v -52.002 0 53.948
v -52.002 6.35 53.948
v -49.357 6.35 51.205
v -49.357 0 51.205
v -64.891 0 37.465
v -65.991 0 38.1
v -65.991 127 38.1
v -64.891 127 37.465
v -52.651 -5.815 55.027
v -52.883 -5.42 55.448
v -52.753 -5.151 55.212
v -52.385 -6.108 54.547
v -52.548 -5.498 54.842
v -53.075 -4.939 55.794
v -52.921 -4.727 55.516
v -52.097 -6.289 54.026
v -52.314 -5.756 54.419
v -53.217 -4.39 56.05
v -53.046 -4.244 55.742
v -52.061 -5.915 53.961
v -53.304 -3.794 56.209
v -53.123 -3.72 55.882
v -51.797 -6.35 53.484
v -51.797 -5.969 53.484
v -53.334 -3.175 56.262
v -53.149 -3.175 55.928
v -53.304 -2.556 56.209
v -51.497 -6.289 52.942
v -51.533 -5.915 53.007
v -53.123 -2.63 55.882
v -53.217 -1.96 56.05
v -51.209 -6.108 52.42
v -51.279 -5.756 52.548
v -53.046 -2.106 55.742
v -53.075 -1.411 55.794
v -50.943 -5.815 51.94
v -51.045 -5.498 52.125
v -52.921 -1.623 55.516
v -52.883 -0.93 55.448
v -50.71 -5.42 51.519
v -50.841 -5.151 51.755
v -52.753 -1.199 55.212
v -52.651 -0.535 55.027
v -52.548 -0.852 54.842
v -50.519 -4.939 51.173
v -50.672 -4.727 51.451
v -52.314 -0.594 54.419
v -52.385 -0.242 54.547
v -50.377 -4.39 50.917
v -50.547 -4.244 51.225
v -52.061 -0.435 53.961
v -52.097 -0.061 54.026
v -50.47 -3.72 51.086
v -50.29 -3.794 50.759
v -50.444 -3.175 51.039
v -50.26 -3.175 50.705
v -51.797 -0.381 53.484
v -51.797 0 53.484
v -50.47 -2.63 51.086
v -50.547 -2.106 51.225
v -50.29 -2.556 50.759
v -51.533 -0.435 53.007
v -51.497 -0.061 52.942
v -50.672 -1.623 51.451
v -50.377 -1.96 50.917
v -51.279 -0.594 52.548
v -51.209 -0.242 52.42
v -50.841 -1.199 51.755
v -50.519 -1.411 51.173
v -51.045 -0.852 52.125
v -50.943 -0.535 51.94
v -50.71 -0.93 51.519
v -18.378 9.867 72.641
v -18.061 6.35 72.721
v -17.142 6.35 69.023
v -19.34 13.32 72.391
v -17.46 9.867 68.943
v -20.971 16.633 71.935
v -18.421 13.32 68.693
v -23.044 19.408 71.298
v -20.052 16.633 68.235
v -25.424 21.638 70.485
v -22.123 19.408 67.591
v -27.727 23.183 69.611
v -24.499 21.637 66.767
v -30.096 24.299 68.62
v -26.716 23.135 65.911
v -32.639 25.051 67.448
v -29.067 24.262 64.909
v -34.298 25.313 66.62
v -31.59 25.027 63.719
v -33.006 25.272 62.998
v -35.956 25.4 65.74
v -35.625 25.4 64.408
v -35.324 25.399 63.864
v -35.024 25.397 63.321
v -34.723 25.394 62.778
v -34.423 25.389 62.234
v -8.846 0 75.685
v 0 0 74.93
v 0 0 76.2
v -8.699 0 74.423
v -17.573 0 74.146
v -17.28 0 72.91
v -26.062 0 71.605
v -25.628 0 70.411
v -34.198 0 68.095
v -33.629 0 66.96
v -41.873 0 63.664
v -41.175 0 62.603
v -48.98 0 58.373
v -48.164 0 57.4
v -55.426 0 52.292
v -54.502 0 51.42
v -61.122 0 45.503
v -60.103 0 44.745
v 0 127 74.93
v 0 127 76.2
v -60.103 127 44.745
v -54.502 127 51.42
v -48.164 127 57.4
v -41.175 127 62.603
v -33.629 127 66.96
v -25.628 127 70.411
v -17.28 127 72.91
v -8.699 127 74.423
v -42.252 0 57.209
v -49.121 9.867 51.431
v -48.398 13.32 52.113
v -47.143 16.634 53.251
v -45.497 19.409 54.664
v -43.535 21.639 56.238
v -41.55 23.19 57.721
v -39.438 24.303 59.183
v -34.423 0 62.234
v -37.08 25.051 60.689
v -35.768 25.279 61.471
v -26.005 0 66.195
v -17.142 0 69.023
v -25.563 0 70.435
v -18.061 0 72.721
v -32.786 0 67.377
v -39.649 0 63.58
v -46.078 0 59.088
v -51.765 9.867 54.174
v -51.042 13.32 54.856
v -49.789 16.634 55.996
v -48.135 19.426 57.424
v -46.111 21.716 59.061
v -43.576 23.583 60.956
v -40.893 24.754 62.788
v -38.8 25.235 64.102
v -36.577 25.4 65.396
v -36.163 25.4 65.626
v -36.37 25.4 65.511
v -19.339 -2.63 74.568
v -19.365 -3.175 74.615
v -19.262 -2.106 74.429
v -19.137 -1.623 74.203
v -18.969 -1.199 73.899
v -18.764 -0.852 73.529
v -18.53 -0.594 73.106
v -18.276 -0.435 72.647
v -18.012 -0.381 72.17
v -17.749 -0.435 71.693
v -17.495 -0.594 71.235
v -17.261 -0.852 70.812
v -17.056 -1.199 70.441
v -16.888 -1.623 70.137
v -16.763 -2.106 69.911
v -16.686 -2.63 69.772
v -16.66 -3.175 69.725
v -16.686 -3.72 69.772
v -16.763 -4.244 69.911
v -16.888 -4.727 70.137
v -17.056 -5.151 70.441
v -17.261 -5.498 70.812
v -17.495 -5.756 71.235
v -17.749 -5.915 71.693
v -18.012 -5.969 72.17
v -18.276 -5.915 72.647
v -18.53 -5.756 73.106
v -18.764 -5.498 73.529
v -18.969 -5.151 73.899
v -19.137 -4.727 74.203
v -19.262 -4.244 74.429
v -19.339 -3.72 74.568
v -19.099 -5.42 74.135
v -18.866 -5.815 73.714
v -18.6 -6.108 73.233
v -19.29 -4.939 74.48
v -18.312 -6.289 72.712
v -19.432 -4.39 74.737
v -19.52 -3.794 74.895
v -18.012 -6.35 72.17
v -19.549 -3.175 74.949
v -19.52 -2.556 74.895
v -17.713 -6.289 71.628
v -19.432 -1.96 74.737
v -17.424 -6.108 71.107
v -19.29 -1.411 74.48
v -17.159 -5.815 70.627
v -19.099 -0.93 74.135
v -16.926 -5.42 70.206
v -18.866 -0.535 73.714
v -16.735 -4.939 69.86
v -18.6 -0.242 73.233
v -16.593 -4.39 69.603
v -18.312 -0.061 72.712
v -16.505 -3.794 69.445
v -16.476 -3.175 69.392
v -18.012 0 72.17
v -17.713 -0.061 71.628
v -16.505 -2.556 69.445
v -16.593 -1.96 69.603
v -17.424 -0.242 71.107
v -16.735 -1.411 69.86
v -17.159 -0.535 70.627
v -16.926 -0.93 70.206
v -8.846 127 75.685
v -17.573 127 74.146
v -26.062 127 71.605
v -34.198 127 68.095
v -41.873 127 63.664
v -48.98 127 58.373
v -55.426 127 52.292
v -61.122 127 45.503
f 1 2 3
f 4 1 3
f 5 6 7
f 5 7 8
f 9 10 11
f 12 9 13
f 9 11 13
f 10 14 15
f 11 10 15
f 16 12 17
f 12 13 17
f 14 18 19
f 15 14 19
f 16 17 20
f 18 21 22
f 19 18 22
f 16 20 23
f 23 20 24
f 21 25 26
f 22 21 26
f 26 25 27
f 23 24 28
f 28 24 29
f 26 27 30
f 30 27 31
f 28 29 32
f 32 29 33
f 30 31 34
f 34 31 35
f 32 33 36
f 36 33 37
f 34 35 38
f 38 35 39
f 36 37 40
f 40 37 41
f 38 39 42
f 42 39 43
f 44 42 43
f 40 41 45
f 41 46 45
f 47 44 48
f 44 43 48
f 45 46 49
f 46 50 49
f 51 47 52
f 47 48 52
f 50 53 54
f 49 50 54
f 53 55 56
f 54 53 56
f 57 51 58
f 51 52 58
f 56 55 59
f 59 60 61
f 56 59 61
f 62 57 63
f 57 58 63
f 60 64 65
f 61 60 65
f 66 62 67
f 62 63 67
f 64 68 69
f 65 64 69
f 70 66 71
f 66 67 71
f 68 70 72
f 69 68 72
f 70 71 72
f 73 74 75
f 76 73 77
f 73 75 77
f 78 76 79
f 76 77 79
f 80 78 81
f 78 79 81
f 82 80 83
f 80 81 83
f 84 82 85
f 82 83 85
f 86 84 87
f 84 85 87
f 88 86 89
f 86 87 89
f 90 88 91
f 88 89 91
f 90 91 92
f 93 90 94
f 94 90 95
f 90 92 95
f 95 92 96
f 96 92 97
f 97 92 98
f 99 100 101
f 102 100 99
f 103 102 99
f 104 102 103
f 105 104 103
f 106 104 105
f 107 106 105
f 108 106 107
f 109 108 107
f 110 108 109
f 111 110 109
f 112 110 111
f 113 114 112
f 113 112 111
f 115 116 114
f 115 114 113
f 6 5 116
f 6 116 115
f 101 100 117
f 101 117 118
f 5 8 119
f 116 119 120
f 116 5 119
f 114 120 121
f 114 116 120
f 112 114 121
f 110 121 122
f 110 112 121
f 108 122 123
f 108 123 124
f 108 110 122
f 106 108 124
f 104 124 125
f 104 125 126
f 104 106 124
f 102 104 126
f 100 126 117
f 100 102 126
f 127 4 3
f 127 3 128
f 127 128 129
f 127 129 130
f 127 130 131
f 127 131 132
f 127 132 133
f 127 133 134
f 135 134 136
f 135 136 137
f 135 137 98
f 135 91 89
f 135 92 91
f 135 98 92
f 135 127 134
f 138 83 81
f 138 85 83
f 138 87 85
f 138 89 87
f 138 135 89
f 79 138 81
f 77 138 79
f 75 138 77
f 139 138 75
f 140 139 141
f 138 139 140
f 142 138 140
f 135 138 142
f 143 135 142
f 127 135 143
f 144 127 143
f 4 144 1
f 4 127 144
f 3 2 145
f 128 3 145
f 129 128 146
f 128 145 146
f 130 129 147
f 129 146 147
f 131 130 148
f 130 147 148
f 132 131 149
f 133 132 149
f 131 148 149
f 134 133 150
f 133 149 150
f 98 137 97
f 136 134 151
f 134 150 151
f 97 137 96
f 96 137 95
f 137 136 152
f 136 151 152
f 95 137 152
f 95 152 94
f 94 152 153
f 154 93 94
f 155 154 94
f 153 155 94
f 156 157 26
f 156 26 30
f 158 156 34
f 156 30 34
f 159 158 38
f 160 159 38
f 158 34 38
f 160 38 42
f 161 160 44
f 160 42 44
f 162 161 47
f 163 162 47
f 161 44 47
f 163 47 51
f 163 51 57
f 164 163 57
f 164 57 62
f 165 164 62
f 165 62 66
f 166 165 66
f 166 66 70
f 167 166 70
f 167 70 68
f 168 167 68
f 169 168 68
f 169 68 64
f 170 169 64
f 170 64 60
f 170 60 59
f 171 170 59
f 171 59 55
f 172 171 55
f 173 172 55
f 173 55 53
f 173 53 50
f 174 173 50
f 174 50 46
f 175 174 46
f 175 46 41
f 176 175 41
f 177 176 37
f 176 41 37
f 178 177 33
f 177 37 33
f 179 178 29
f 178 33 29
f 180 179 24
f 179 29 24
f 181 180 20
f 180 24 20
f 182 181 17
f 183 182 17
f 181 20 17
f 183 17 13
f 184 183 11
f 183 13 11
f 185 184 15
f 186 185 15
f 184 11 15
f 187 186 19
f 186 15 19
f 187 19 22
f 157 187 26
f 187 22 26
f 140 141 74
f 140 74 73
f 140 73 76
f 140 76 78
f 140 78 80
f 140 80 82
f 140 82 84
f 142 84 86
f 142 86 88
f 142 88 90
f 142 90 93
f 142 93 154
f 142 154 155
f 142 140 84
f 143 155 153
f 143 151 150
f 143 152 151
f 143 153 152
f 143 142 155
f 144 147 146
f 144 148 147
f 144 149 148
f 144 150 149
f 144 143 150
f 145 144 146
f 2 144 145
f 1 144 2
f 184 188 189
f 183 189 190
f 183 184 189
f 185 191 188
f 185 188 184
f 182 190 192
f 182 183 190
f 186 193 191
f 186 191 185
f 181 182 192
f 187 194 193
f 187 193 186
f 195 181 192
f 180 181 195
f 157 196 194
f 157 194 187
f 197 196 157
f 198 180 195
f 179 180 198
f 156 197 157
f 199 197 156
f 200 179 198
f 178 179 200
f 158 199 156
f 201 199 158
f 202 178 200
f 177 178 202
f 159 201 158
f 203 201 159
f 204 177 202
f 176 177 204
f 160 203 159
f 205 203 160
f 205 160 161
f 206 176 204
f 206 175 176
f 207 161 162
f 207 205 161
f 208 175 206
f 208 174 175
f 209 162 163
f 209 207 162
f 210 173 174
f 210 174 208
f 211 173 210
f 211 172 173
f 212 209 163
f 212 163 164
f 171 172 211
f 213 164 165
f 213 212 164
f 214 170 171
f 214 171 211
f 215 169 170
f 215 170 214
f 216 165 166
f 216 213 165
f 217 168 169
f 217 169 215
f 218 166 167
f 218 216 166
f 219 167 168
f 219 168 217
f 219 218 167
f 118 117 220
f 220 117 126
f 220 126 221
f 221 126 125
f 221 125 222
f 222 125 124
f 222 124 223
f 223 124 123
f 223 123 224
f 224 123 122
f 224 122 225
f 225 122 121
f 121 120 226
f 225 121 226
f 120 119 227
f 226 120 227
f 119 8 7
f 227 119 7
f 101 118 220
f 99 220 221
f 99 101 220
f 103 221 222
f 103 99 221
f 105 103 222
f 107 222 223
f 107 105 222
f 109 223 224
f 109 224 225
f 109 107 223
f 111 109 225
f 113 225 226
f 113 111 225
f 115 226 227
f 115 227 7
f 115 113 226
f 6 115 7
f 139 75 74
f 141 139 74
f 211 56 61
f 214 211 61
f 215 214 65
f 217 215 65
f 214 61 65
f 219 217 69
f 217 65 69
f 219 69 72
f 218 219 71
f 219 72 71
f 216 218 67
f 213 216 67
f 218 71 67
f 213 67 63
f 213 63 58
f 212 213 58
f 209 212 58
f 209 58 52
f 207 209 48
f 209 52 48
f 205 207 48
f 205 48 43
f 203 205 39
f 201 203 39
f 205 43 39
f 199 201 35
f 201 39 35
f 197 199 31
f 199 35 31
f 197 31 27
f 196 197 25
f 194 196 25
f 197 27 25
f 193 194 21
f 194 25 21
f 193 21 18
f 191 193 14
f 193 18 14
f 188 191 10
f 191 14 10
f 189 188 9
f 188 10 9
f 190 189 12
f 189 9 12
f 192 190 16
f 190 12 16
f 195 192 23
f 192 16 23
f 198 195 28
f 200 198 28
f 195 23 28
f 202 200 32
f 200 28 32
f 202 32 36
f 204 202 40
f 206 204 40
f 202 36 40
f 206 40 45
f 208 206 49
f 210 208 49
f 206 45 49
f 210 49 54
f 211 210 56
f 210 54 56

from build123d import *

# Parameters (mm, degrees)
EXTRUDE_THIN1_DEPTH      = 127
EXTRUDE_THIN2_DEPTH      = 25.4
FILLET1_R                = 19.05
BOSS_EXTRUDE3_DEPTH      = 0.762
BOSS_EXTRUDE3_DEPTH_BACK = 37.846
SKETCH11_R               = 3.175
SKETCH13_R               = 2.794
CUT_EXTRUDE1_DEPTH       = 43.18


with BuildPart() as part:
    # Sketch1 → Extrude-Thin1 (new body)
    with BuildSketch(Plane(origin=(0, 0, 0), x_dir=(1, 0, 0), z_dir=(0, 1, 0))):
        with BuildLine():
            ThreePointArc((0, -76.2), (-38.1, -65.991135768), (-65.991135768, -38.1))
            Line((-65.991135768, -38.1), (-64.891283506, -37.465))
            ThreePointArc((-64.891283506, -37.465), (-37.465, -64.891283506), (0, -74.93))
            Line((0, -74.93), (0, -76.2))
        make_face()
    extrude(amount=EXTRUDE_THIN1_DEPTH)


with BuildPart() as body_2:
    # Sketch8 → Extrude-Thin2 (new body)
    with BuildSketch(Plane(origin=(0, 0, 0), x_dir=(1, 0, 0), z_dir=(0, 1, 0))):
        with BuildLine():
            ThreePointArc((-18.060810272, -72.720781296), (-36.26692626, -65.568399093), (-52.001511157, -53.947638849))
            Line((-52.001511157, -53.947638849), (-49.357366522, -51.204538569))
            ThreePointArc((-49.357366522, -51.204538569), (-34.422845264, -62.234412699), (-17.142463987, -69.02311445))
            Line((-17.142463987, -69.02311445), (-18.060810272, -72.720781296))
        make_face()
    extrude(amount=EXTRUDE_THIN2_DEPTH)

    # Fillet1
    # the kernel refuses this fillet: 19.05 mm, written as the material it takes off along each edge
    with BuildSketch(Plane(origin=(-85.053319095, 25.4, 88.236392355), x_dir=(0, -1, 0), z_dir=(0.694001216558829, 0, -0.7199738268957181)), Plane(origin=(-5.663135424, 25.4, 22.802278881), x_dir=(0, -1, 0), z_dir=(-0.24103577034940327, 0, 0.9705162324310036))) as fillet1_piece_1:
        with BuildLine():
            CenterArc((FILLET1_R, -FILLET1_R), FILLET1_R, 90, 90)
            Line((0, -FILLET1_R), (0, 0))
            Line((0, 0), (FILLET1_R, 0))
        make_face()
    extrude(amount=99.06, mode=Mode.SUBTRACT)


with BuildPart() as body_3:
    # Sketch11 → Boss-Extrude3 (new, two sides: drawn at the far end of the back side and taken through both)
    with BuildSketch(Plane(origin=(16.107451267, 0, 8.909287941), x_dir=(0.48401076017425226, 0, -0.8750620458204906), z_dir=(0.8750620458204906, 0, 0.48401076017425226)).offset(-BOSS_EXTRUDE3_DEPTH_BACK)):
        with Locations((-71.871644766, -3.175)):
            Circle(SKETCH11_R)
    extrude(amount=BOSS_EXTRUDE3_DEPTH + BOSS_EXTRUDE3_DEPTH_BACK)

    # Sketch13 → Cut-Extrude1 (cut)
    with BuildSketch(Plane(origin=(-17.010146919, 0, -9.408583289), x_dir=(-0.48401076017425226, 0, 0.8750620458204906), z_dir=(-0.8750620458204907, 0, -0.4840107601742523))):
        with Locations((71.871644766, -3.175)):
            Circle(SKETCH13_R)
    extrude(amount=-CUT_EXTRUDE1_DEPTH, mode=Mode.SUBTRACT)


solid = Compound([part.part, body_2.part, body_3.part])
